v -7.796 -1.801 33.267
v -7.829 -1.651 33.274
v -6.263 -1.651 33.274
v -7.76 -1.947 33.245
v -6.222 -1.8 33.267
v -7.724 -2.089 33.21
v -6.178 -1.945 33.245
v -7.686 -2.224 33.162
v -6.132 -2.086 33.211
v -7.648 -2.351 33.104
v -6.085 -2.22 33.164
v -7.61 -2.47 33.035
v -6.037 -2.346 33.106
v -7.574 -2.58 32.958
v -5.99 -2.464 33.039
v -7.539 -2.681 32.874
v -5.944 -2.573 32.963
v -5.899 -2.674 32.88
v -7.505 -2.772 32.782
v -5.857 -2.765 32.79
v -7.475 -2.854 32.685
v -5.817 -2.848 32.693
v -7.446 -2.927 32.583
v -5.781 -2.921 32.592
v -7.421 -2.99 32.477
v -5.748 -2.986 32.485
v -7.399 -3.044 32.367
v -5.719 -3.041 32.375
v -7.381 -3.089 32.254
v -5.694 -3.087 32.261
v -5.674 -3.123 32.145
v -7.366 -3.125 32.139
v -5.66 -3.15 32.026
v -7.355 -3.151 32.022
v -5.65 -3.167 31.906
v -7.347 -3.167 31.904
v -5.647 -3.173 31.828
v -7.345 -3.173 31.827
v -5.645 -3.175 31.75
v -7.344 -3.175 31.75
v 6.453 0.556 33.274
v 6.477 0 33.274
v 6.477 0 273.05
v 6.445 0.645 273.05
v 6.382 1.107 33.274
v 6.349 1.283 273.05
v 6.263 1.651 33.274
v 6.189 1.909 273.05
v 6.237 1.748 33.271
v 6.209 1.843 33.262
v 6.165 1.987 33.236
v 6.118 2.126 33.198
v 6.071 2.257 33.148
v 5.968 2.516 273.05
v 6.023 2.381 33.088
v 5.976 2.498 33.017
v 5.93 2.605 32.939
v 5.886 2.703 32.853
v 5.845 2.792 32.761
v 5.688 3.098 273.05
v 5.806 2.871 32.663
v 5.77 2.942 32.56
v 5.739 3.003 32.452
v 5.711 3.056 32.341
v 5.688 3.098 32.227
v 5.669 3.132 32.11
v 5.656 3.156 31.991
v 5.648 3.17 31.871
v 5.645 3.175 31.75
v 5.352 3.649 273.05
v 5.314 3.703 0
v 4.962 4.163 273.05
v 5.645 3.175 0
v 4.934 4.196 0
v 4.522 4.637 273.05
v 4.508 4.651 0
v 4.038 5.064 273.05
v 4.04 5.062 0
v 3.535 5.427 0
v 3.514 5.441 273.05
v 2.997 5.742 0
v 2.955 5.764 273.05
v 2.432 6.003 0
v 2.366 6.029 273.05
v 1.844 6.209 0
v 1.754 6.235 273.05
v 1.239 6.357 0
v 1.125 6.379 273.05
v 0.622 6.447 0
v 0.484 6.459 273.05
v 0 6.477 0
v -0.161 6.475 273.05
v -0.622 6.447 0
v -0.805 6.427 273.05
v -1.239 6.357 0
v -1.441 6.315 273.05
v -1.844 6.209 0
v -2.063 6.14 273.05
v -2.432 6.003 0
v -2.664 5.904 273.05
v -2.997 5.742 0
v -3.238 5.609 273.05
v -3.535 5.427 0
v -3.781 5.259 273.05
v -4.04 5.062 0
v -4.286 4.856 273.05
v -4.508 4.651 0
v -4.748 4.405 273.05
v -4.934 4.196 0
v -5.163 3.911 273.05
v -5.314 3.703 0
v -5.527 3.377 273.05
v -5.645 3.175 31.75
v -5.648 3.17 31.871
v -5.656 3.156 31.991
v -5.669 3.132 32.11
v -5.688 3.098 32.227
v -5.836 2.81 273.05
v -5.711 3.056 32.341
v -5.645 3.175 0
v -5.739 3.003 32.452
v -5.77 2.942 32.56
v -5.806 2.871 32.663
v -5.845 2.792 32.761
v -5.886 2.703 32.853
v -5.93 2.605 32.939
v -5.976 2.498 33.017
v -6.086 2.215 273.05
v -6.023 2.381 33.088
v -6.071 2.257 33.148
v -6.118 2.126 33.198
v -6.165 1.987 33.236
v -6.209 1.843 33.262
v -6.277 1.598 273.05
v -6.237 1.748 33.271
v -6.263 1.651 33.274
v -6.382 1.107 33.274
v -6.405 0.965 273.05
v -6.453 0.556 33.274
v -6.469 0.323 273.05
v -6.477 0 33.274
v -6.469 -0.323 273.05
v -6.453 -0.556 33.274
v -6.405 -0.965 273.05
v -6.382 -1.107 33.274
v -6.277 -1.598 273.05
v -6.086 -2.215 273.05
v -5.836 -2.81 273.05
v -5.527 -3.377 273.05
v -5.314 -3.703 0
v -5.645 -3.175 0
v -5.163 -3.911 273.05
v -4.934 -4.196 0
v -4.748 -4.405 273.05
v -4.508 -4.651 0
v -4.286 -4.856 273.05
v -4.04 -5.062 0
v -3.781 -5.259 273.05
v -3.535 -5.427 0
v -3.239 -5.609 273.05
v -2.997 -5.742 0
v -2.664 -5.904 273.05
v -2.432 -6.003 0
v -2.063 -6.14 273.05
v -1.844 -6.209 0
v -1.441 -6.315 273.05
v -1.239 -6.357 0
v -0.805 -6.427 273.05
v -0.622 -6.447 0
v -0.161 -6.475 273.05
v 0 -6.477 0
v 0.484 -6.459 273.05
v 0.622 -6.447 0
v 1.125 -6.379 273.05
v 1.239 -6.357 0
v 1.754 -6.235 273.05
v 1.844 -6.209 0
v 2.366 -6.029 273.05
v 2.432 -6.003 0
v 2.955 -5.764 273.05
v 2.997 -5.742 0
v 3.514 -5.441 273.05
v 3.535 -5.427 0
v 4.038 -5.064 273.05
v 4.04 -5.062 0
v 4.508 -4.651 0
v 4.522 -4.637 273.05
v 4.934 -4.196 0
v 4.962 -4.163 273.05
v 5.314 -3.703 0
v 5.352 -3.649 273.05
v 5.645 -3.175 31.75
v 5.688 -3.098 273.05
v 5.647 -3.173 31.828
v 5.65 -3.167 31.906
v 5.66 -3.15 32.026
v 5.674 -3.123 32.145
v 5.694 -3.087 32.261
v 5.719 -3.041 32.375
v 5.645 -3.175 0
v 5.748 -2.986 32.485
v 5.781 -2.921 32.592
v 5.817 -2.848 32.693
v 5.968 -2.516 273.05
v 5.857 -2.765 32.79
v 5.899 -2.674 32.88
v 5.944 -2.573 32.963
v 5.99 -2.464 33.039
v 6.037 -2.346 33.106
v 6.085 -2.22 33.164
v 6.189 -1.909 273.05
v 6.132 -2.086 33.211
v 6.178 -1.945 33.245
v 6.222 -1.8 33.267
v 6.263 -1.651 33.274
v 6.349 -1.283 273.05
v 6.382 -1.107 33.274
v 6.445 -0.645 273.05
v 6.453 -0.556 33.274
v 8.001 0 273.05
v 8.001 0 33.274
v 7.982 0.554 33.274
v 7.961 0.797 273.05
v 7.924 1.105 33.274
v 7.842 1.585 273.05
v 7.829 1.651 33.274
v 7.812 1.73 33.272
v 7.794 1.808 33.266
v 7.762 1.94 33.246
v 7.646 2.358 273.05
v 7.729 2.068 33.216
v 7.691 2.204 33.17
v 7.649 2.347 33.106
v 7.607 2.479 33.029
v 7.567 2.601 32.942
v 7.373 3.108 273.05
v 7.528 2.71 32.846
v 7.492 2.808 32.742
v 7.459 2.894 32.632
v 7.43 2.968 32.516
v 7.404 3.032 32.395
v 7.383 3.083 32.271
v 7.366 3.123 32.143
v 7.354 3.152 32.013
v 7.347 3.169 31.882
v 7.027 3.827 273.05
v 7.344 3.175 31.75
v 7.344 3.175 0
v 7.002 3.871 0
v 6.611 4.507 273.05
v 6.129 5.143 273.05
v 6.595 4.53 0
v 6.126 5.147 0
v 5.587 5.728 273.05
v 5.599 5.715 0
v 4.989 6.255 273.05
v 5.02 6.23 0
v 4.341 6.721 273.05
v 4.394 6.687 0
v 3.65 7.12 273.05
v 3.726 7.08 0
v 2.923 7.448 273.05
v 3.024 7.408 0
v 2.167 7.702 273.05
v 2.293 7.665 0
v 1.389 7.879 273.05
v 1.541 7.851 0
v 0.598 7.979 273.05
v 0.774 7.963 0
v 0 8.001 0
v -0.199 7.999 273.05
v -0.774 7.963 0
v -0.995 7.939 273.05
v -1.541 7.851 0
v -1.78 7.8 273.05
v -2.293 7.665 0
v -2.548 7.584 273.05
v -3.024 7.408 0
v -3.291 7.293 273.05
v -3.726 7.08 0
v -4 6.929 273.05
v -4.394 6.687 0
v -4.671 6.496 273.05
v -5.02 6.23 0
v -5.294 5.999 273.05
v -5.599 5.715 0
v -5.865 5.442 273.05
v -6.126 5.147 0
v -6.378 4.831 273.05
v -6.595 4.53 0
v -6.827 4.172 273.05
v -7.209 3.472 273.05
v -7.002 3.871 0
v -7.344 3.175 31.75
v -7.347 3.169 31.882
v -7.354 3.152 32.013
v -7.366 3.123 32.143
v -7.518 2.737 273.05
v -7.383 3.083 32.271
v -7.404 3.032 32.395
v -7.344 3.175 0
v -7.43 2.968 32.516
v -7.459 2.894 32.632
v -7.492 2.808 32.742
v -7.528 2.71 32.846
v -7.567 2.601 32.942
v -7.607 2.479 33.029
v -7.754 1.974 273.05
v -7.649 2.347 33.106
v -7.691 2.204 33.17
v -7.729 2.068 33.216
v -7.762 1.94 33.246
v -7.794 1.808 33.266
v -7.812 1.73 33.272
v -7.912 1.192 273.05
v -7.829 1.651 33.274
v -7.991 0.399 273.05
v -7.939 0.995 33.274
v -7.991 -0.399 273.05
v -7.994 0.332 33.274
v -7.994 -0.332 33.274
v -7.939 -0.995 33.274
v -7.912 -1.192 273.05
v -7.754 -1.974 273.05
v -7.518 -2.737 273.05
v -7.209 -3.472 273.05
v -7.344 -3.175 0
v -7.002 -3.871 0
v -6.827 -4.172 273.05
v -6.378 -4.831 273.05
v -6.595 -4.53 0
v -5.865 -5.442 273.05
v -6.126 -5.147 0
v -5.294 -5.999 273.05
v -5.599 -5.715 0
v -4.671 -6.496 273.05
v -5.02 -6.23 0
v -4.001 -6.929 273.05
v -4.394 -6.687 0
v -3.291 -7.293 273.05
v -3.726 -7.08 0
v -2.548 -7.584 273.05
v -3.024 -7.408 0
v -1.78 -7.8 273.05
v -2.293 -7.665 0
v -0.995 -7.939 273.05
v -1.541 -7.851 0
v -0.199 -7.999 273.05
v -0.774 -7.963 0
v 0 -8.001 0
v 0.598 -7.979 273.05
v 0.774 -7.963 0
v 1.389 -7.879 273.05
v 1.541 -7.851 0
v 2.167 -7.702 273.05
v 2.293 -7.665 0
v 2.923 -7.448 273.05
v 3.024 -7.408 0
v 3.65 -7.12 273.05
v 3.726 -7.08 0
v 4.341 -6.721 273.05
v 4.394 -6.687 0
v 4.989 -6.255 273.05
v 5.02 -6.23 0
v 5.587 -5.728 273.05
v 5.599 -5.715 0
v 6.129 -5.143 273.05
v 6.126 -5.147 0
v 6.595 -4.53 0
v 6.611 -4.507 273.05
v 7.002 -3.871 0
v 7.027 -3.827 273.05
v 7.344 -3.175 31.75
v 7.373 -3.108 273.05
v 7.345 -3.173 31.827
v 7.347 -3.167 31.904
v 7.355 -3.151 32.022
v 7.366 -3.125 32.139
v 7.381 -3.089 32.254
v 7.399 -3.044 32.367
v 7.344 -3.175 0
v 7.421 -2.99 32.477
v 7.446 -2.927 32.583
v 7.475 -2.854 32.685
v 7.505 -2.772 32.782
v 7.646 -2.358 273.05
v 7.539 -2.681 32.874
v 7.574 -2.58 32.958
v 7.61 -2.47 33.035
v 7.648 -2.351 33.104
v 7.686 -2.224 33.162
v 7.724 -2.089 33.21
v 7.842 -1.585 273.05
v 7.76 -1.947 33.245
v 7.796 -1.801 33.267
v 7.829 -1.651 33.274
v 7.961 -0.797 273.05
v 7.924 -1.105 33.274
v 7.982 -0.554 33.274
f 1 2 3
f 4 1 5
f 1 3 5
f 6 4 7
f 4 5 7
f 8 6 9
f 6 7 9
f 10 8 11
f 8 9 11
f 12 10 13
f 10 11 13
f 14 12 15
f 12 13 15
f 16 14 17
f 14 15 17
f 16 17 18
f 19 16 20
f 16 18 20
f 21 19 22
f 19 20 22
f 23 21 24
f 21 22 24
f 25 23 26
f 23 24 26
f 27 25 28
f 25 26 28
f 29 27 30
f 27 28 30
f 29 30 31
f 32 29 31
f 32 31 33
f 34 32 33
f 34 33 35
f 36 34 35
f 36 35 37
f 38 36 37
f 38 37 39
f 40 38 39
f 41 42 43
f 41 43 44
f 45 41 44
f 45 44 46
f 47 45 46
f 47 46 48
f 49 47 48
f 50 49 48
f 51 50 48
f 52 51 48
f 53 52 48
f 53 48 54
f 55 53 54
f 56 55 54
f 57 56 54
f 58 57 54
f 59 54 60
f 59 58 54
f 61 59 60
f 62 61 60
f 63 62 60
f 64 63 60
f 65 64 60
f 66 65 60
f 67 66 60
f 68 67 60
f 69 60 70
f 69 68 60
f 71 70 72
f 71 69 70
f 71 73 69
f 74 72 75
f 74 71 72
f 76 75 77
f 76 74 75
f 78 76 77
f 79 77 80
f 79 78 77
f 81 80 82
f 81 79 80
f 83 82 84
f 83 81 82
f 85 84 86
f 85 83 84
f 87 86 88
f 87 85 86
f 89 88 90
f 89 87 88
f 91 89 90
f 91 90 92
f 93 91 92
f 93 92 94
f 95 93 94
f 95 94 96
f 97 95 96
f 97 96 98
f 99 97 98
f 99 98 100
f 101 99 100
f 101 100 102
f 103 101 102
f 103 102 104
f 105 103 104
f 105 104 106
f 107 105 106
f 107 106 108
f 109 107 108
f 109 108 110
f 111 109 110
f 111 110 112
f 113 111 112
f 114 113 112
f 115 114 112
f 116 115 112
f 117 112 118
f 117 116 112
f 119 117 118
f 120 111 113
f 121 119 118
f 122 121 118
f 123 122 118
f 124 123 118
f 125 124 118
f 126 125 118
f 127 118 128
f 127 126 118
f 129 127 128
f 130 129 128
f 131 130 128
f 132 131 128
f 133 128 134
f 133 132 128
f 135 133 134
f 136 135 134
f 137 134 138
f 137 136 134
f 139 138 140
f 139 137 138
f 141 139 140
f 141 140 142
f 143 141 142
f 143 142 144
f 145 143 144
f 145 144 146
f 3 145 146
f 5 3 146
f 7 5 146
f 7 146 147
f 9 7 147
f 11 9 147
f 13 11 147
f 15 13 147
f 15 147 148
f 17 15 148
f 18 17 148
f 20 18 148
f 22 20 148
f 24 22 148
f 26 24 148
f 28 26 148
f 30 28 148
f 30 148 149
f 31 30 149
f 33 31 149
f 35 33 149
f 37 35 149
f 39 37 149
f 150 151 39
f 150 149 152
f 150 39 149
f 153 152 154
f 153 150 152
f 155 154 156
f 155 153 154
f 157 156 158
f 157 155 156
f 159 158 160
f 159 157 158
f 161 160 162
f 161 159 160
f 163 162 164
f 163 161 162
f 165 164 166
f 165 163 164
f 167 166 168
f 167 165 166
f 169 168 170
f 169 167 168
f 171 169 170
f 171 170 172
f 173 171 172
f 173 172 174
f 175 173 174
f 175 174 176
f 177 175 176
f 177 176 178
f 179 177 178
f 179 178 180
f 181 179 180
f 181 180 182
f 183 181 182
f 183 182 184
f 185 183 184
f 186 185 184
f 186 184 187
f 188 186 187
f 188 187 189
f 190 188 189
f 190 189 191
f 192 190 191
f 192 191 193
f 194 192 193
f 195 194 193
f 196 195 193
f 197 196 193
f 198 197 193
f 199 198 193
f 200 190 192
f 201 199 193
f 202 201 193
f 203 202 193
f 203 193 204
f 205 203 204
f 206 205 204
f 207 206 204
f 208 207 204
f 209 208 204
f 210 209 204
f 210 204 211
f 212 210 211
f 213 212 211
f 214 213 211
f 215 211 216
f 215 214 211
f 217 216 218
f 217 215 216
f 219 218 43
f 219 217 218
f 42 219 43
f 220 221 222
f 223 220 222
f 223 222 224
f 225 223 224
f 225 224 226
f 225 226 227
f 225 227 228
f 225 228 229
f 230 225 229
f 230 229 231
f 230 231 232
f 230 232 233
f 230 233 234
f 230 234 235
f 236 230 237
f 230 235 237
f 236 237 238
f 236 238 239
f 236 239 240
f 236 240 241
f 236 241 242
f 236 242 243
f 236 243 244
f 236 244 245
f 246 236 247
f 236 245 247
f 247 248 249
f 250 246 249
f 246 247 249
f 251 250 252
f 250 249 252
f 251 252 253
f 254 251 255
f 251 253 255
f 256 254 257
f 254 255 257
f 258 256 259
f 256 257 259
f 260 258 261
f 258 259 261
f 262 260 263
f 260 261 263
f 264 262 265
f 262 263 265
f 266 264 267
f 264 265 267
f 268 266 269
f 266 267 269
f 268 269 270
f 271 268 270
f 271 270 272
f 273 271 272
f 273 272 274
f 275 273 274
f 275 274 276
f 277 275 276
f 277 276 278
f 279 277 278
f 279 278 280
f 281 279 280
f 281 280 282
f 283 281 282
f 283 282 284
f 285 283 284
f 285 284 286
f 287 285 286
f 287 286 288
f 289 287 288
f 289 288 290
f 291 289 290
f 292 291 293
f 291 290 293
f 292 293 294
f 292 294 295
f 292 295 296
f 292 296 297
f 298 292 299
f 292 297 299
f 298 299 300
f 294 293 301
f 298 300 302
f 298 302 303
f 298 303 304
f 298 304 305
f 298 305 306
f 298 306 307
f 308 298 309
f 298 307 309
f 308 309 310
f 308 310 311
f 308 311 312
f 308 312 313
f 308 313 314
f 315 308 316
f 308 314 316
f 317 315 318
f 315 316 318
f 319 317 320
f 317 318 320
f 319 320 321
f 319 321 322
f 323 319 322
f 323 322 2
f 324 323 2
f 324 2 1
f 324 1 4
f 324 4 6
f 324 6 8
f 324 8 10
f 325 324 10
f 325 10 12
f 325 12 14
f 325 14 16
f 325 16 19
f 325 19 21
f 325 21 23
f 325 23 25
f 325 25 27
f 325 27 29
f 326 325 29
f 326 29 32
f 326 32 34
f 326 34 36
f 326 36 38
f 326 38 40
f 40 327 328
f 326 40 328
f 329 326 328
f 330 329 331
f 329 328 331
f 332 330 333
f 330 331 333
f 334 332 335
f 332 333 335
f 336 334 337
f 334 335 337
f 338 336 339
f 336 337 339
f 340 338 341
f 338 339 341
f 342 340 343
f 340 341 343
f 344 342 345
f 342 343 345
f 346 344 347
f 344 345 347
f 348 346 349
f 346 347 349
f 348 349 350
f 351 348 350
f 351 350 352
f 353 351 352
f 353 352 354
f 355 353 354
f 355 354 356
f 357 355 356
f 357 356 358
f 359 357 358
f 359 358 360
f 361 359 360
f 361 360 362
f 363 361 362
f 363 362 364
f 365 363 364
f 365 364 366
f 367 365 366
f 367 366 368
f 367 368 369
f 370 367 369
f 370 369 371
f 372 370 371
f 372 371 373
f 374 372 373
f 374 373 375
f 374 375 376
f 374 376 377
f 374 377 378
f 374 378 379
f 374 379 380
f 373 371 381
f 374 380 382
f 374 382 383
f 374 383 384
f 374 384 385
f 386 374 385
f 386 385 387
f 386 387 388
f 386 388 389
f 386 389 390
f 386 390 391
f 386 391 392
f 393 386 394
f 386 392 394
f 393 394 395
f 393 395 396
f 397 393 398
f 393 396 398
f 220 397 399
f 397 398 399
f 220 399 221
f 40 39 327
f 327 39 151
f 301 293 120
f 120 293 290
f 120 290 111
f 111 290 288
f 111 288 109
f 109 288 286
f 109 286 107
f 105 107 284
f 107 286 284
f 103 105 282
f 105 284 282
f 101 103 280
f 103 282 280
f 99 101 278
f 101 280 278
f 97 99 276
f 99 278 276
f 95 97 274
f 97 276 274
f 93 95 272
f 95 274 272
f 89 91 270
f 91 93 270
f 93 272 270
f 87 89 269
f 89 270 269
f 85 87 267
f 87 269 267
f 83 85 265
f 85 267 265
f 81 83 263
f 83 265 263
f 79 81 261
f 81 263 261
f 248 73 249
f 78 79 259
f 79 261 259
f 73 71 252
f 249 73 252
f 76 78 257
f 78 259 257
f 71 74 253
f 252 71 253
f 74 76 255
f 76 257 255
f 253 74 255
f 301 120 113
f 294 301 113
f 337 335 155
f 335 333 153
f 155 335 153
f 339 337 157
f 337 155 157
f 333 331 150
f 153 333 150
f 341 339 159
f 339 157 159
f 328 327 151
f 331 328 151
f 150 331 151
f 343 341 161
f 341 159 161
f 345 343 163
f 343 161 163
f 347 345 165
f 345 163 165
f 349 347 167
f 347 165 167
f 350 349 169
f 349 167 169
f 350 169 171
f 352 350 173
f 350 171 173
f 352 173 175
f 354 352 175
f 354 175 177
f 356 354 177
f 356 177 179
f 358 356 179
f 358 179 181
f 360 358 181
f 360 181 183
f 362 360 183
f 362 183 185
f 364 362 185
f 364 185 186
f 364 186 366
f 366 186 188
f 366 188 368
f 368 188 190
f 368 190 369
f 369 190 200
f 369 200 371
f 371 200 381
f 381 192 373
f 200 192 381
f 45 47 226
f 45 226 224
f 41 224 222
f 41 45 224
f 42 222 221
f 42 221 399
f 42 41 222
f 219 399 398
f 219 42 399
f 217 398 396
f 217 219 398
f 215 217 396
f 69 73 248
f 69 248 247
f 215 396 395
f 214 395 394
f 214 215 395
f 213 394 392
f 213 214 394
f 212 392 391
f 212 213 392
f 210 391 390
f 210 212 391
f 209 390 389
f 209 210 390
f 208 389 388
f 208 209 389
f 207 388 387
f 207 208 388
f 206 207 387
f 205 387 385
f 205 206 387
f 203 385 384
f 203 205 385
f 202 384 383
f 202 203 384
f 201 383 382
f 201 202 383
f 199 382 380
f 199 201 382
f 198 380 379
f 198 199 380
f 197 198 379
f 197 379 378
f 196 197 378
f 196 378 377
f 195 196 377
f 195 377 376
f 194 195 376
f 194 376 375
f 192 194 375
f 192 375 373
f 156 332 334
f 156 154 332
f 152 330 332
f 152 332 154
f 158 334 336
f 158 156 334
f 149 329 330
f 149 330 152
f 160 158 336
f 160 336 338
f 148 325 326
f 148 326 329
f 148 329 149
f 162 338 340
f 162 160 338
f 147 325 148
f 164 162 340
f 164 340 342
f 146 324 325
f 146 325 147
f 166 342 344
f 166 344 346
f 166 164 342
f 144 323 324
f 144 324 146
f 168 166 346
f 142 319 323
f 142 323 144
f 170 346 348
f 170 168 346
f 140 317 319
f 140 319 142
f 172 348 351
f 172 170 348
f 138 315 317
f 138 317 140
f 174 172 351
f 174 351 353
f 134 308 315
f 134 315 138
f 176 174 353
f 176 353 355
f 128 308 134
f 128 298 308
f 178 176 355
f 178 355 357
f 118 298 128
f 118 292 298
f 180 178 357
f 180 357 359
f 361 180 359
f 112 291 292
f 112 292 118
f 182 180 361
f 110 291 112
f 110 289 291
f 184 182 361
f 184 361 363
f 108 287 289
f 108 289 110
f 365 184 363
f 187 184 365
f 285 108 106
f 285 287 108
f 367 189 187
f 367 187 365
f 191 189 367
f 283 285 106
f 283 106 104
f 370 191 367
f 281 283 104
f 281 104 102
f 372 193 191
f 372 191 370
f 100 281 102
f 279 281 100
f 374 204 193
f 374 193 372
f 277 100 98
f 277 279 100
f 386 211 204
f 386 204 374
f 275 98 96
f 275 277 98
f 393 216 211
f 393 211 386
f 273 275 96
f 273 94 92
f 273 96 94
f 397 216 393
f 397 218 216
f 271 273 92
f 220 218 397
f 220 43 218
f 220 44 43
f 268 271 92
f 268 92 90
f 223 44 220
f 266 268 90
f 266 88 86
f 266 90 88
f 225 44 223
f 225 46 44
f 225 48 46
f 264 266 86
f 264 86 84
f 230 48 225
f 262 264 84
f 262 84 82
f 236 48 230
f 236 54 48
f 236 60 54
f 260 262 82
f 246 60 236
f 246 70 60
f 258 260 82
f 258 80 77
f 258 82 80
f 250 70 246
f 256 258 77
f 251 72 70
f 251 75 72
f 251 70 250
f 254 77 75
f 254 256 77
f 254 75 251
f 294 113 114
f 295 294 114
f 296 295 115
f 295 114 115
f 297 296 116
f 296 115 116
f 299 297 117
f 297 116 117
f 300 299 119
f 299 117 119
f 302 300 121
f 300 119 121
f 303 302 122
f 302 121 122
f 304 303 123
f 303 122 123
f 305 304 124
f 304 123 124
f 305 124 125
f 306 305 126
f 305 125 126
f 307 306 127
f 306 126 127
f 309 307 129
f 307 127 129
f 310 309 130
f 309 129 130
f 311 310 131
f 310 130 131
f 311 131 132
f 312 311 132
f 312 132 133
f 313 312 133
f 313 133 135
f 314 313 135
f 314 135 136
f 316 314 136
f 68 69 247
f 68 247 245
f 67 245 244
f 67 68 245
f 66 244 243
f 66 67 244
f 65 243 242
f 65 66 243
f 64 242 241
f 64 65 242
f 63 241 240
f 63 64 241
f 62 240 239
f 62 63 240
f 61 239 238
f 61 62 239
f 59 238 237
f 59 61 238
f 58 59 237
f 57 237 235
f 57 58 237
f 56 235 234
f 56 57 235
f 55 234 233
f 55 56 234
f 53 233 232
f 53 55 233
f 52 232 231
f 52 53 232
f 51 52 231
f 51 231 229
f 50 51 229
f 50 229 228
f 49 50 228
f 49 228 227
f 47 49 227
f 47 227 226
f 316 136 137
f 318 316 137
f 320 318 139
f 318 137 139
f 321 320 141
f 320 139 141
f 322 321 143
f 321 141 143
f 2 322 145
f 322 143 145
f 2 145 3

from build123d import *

# Parameters (mm, degrees)
SKETCH1_R               = 8.001
SKETCH1_R_2             = 6.477
BOSS_EXTRUDE1_DEPTH     = 273.05
CUT_EXTRUDE1_DEPTH      = 9.001
CUT_EXTRUDE1_DEPTH_BACK = 9.001


with BuildPart() as part:
    # Sketch1 → Boss-Extrude1 (new body)
    with BuildSketch(Plane.XY):
        Circle(SKETCH1_R)
        Circle(SKETCH1_R_2, mode=Mode.SUBTRACT)
    extrude(amount=BOSS_EXTRUDE1_DEPTH)

    # Sketch2 → Cut-Extrude1 (cut, two sides)
    with BuildSketch(Plane(origin=(0, 0, 0), x_dir=(0, 0, -1), z_dir=(1, 0, 0))) as cut_extrude1_sk:
        with BuildLine():
            Line((556.557244855, 3.175), (0, 3.175))
            Line((0, 3.175), (-31.75, 3.175))
            ThreePointArc((-31.75, 3.175), (-32.827630735, 2.728630735), (-33.274, 1.651))
            Line((-33.274, 1.651), (-33.274, -1.651))
            ThreePointArc((-33.274, -1.651), (-32.827630735, -2.728630735), (-31.75, -3.175))
            Line((-31.75, -3.175), (0, -3.175))
            Line((0, -3.175), (556.557244855, -3.175))
            Line((556.557244855, -3.175), (1669.671734566, -3.175))
            Line((1669.671734566, -3.175), (1669.671734566, 3.175))
            Line((1669.671734566, 3.175), (556.557244855, 3.175))
        make_face()
    extrude(amount=CUT_EXTRUDE1_DEPTH, mode=Mode.SUBTRACT)
    extrude(cut_extrude1_sk.sketch, amount=-CUT_EXTRUDE1_DEPTH_BACK, mode=Mode.SUBTRACT)


solid = part.part
